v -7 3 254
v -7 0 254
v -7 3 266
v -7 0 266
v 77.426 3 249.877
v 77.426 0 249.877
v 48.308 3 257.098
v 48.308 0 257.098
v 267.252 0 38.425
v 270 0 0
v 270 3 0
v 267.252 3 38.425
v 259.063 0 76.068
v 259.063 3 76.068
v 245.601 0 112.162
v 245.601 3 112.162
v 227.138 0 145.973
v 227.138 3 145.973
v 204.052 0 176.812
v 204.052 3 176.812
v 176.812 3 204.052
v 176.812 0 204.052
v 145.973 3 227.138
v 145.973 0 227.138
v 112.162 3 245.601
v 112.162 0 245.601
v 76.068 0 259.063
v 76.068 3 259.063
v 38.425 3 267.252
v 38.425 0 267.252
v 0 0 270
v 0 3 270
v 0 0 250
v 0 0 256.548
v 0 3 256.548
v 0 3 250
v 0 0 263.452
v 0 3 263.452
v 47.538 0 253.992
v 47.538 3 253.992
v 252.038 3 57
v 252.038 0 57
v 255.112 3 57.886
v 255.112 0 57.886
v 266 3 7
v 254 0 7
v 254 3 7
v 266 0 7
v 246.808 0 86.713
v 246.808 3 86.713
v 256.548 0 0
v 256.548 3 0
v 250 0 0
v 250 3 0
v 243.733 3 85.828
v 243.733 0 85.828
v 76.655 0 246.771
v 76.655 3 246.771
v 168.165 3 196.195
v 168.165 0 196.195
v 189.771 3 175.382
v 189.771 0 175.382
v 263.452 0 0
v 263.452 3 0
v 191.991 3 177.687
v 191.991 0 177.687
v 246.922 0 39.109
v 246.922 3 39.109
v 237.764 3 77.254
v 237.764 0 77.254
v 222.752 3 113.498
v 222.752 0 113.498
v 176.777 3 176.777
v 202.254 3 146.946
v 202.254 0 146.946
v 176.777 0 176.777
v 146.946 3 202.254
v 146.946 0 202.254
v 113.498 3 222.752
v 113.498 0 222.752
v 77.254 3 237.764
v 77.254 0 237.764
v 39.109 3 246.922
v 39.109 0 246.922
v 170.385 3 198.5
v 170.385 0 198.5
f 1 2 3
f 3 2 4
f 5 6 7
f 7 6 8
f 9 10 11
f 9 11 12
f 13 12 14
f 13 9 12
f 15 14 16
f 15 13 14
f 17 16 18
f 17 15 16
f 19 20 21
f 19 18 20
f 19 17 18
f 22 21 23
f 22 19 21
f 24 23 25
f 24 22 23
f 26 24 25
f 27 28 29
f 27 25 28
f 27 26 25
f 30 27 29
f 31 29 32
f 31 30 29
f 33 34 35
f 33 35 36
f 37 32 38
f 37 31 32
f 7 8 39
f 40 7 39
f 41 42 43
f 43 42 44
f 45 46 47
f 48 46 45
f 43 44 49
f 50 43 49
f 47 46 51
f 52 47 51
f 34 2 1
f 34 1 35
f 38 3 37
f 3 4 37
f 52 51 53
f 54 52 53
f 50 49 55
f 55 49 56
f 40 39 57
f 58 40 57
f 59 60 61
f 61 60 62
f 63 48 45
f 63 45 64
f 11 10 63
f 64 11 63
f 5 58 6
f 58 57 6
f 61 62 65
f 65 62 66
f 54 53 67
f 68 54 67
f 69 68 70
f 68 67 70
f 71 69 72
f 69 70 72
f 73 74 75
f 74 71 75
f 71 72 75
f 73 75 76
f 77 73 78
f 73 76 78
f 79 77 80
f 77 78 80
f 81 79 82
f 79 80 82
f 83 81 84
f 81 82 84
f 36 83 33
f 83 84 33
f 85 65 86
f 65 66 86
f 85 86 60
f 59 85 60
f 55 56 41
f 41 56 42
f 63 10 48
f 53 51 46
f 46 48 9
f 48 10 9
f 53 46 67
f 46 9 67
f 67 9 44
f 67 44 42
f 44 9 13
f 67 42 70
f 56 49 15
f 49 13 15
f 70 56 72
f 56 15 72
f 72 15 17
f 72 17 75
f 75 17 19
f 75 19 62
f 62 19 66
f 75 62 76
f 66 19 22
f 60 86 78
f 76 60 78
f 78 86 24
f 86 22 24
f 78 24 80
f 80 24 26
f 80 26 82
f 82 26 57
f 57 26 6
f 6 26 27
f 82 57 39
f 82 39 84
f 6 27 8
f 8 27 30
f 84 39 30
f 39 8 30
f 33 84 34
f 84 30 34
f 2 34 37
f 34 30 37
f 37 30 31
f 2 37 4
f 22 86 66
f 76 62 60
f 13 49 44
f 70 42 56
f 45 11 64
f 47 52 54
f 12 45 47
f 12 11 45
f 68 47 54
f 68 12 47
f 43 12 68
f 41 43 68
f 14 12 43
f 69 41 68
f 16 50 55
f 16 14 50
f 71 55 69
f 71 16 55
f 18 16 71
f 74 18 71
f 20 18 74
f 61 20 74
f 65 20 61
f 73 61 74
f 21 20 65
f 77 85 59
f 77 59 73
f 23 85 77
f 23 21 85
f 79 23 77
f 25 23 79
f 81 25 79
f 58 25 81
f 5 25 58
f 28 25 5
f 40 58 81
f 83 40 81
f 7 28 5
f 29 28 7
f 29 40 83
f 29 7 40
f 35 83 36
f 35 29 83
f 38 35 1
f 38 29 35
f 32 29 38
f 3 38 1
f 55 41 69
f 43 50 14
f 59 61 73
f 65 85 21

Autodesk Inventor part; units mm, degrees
ref_plane "YZ Plane" through (0, 0, 0) normal (1, 0, 0) x (0, 1, 0)
ref_plane "XZ Plane" through (0, 0, 0) normal (0, 1, 0) x (-1, 0, 0)
ref_plane "XY Plane" through (0, 0, 0) normal (0, 0, 1) x (1, 0, 0)
sketch "Sketch1" plane through (0, 0, 0) normal (0, 1, 0) x (-1, 0, 0)
  circle A0 centre (0, 0) radius 250
  circle A1 centre (0, 0) radius 270
  line L0 (270, 0) -> (250, 0)
  line L1 (-270, 0) -> (-250, 0)
  line L2 (0, 0) -> (-250, 0) construction
  line L3 (0, 250) -> (0, 0) construction
  line L4 (0, 270) -> (0, 250)
  line L5 (-250, 0) -> (-270, 0)
  line L6 (-254, 7) -> (-266, 7)
  line L7 (-266, 7) -> (-263.4522, 0)
  line L8 (-254, 7) -> (-256.5478, 0)
  line L9 (-260, 0) -> (-260, 7) construction
  line L10 (-255.1125, 57.8859) -> (-246.8075, 86.7134)
  line L11 (-246.8075, 86.7134) -> (-243.7326, 85.8275)
  line L12 (-243.7326, 85.8275) -> (-252.0376, 57)
  line L13 (-252.0376, 57) -> (-255.1125, 57.8859)
  line L14 (-255.1125, 57.8859) -> (-243.7326, 85.8275) construction
  line L15 (-246.8075, 86.7134) -> (-252.0376, 57) construction
  circle A2 centre (0, 0) radius 260 construction
  line L16 (-7, -254) -> (0, -256.5478)
  line L17 (-7, -266) -> (0, -263.4522)
  line L18 (-7, -254) -> (-7, -266)
  line L19 (254, -7) -> (256.5478, 0)
  line L20 (266, -7) -> (263.4522, 0)
  line L21 (254, -7) -> (266, -7)
  line L22 (7, 254) -> (0, 256.5478)
  line L23 (7, 266) -> (0, 263.4522)
  line L24 (7, 254) -> (7, 266)
  line L25 (-249.8769, -77.4256) -> (-257.0983, -48.3078)
  line L26 (-246.771, -76.6553) -> (-249.8769, -77.4256)
  line L27 (-253.9924, -47.5375) -> (-246.771, -76.6553)
  line L28 (-257.0983, -48.3078) -> (-253.9924, -47.5375)
  line L29 (-177.6869, -191.991) -> (-198.4998, -170.3849)
  line L30 (-175.3822, -189.771) -> (-177.6869, -191.991)
  line L31 (-196.1951, -168.1649) -> (-175.3822, -189.771)
  line L32 (-198.4998, -170.3849) -> (-196.1951, -168.1649)
  line L33 (-57.8859, -255.1125) -> (-86.7134, -246.8075)
  line L34 (-57, -252.0376) -> (-57.8859, -255.1125)
  line L35 (-85.8275, -243.7326) -> (-57, -252.0376)
  line L36 (-86.7134, -246.8075) -> (-85.8275, -243.7326)
  line L37 (77.4256, -249.8769) -> (48.3078, -257.0983)
  line L38 (76.6553, -246.771) -> (77.4256, -249.8769)
  line L39 (47.5375, -253.9924) -> (76.6553, -246.771)
  line L40 (48.3078, -257.0983) -> (47.5375, -253.9924)
  line L41 (191.991, -177.6869) -> (170.3849, -198.4998)
  line L42 (189.771, -175.3822) -> (191.991, -177.6869)
  line L43 (168.1649, -196.1951) -> (189.771, -175.3822)
  line L44 (170.3849, -198.4998) -> (168.1649, -196.1951)
  line L45 (255.1125, -57.8859) -> (246.8075, -86.7134)
  line L46 (252.0376, -57) -> (255.1125, -57.8859)
  line L47 (243.7326, -85.8275) -> (252.0376, -57)
  line L48 (246.8075, -86.7134) -> (243.7326, -85.8275)
  line L49 (249.8769, 77.4256) -> (257.0983, 48.3078)
  line L50 (246.771, 76.6553) -> (249.8769, 77.4256)
  line L51 (253.9924, 47.5375) -> (246.771, 76.6553)
  line L52 (257.0983, 48.3078) -> (253.9924, 47.5375)
  line L53 (177.6869, 191.991) -> (198.4998, 170.3849)
  line L54 (175.3822, 189.771) -> (177.6869, 191.991)
  line L55 (196.1951, 168.1649) -> (175.3822, 189.771)
  line L56 (198.4998, 170.3849) -> (196.1951, 168.1649)
  line L57 (57.8859, 255.1125) -> (86.7134, 246.8075)
  line L58 (57, 252.0376) -> (57.8859, 255.1125)
  line L59 (85.8275, 243.7326) -> (57, 252.0376)
  line L60 (86.7134, 246.8075) -> (85.8275, 243.7326)
  line L61 (-77.4256, 249.8769) -> (-48.3078, 257.0983)
  line L62 (-76.6553, 246.771) -> (-77.4256, 249.8769)
  line L63 (-47.5375, 253.9924) -> (-76.6553, 246.771)
  line L64 (-48.3078, 257.0983) -> (-47.5375, 253.9924)
  line L65 (-191.991, 177.6869) -> (-170.3849, 198.4998)
  line L66 (-189.771, 175.3822) -> (-191.991, 177.6869)
  line L67 (-168.1649, 196.1951) -> (-189.771, 175.3822)
  line L68 (-170.3849, 198.4998) -> (-168.1649, 196.1951)
  point P0 (260, 0)
  point P1 (-260, 0)
  point P2 (-249.4226, 71.8567)
  point P3 (-49.7078, 255.2041)
  point P4 (-253.5751, 57.4429)
  point P5 (-245.2701, 86.2705)
  point P6 (-7, -260)
  point P7 (260, -7)
  point P8 (7, 260)
  point P9 (-248.3239, -77.0405)
  point P10 (-255.5453, -47.9226)
  point P11 (-176.5346, -190.881)
  point P12 (-197.3475, -169.2749)
  point P13 (-57.4429, -253.5751)
  point P14 (-86.2705, -245.2701)
  point P15 (77.0405, -248.3239)
  point P16 (47.9226, -255.5453)
  point P17 (190.881, -176.5346)
  point P18 (169.2749, -197.3475)
  point P19 (253.5751, -57.4429)
  point P20 (245.2701, -86.2705)
  point P21 (248.3239, 77.0405)
  point P22 (255.5453, 47.9226)
  point P23 (176.5346, 190.881)
  point P24 (197.3475, 169.2749)
  point P25 (57.4429, 253.5751)
  point P26 (86.2705, 245.2701)
  point P27 (-77.0405, 248.3239)
  point P28 (-47.9226, 255.5453)
  point P29 (-190.881, 176.5346)
  point P30 (-169.2749, 197.3475)
  point P31 (-256.5478, 0)
  point P32 (0, 256.5478)
  point P33 (0, 263.4522)
  dimension "d0" = 500
  dimension "d1" = 540
  dimension "d4" = 90
  dimension "d5" = 7
  dimension "d6" = 70
  dimension "d8" = 12
  dimension "d13" = 3.2
  dimension "d14" = 30
  dimension "d15" = 50
  dimension "d20" = 520
  dimension "d23" = 360
  dimension "d27" = 360
extrude "Extrusion1" add sketch "Sketch1" along normal blind 3 contours A0 L1 L8 L6 L7 A1 L4 | L4 L23 L24 L22
properties part number "R50_CM_CIRCULO"
